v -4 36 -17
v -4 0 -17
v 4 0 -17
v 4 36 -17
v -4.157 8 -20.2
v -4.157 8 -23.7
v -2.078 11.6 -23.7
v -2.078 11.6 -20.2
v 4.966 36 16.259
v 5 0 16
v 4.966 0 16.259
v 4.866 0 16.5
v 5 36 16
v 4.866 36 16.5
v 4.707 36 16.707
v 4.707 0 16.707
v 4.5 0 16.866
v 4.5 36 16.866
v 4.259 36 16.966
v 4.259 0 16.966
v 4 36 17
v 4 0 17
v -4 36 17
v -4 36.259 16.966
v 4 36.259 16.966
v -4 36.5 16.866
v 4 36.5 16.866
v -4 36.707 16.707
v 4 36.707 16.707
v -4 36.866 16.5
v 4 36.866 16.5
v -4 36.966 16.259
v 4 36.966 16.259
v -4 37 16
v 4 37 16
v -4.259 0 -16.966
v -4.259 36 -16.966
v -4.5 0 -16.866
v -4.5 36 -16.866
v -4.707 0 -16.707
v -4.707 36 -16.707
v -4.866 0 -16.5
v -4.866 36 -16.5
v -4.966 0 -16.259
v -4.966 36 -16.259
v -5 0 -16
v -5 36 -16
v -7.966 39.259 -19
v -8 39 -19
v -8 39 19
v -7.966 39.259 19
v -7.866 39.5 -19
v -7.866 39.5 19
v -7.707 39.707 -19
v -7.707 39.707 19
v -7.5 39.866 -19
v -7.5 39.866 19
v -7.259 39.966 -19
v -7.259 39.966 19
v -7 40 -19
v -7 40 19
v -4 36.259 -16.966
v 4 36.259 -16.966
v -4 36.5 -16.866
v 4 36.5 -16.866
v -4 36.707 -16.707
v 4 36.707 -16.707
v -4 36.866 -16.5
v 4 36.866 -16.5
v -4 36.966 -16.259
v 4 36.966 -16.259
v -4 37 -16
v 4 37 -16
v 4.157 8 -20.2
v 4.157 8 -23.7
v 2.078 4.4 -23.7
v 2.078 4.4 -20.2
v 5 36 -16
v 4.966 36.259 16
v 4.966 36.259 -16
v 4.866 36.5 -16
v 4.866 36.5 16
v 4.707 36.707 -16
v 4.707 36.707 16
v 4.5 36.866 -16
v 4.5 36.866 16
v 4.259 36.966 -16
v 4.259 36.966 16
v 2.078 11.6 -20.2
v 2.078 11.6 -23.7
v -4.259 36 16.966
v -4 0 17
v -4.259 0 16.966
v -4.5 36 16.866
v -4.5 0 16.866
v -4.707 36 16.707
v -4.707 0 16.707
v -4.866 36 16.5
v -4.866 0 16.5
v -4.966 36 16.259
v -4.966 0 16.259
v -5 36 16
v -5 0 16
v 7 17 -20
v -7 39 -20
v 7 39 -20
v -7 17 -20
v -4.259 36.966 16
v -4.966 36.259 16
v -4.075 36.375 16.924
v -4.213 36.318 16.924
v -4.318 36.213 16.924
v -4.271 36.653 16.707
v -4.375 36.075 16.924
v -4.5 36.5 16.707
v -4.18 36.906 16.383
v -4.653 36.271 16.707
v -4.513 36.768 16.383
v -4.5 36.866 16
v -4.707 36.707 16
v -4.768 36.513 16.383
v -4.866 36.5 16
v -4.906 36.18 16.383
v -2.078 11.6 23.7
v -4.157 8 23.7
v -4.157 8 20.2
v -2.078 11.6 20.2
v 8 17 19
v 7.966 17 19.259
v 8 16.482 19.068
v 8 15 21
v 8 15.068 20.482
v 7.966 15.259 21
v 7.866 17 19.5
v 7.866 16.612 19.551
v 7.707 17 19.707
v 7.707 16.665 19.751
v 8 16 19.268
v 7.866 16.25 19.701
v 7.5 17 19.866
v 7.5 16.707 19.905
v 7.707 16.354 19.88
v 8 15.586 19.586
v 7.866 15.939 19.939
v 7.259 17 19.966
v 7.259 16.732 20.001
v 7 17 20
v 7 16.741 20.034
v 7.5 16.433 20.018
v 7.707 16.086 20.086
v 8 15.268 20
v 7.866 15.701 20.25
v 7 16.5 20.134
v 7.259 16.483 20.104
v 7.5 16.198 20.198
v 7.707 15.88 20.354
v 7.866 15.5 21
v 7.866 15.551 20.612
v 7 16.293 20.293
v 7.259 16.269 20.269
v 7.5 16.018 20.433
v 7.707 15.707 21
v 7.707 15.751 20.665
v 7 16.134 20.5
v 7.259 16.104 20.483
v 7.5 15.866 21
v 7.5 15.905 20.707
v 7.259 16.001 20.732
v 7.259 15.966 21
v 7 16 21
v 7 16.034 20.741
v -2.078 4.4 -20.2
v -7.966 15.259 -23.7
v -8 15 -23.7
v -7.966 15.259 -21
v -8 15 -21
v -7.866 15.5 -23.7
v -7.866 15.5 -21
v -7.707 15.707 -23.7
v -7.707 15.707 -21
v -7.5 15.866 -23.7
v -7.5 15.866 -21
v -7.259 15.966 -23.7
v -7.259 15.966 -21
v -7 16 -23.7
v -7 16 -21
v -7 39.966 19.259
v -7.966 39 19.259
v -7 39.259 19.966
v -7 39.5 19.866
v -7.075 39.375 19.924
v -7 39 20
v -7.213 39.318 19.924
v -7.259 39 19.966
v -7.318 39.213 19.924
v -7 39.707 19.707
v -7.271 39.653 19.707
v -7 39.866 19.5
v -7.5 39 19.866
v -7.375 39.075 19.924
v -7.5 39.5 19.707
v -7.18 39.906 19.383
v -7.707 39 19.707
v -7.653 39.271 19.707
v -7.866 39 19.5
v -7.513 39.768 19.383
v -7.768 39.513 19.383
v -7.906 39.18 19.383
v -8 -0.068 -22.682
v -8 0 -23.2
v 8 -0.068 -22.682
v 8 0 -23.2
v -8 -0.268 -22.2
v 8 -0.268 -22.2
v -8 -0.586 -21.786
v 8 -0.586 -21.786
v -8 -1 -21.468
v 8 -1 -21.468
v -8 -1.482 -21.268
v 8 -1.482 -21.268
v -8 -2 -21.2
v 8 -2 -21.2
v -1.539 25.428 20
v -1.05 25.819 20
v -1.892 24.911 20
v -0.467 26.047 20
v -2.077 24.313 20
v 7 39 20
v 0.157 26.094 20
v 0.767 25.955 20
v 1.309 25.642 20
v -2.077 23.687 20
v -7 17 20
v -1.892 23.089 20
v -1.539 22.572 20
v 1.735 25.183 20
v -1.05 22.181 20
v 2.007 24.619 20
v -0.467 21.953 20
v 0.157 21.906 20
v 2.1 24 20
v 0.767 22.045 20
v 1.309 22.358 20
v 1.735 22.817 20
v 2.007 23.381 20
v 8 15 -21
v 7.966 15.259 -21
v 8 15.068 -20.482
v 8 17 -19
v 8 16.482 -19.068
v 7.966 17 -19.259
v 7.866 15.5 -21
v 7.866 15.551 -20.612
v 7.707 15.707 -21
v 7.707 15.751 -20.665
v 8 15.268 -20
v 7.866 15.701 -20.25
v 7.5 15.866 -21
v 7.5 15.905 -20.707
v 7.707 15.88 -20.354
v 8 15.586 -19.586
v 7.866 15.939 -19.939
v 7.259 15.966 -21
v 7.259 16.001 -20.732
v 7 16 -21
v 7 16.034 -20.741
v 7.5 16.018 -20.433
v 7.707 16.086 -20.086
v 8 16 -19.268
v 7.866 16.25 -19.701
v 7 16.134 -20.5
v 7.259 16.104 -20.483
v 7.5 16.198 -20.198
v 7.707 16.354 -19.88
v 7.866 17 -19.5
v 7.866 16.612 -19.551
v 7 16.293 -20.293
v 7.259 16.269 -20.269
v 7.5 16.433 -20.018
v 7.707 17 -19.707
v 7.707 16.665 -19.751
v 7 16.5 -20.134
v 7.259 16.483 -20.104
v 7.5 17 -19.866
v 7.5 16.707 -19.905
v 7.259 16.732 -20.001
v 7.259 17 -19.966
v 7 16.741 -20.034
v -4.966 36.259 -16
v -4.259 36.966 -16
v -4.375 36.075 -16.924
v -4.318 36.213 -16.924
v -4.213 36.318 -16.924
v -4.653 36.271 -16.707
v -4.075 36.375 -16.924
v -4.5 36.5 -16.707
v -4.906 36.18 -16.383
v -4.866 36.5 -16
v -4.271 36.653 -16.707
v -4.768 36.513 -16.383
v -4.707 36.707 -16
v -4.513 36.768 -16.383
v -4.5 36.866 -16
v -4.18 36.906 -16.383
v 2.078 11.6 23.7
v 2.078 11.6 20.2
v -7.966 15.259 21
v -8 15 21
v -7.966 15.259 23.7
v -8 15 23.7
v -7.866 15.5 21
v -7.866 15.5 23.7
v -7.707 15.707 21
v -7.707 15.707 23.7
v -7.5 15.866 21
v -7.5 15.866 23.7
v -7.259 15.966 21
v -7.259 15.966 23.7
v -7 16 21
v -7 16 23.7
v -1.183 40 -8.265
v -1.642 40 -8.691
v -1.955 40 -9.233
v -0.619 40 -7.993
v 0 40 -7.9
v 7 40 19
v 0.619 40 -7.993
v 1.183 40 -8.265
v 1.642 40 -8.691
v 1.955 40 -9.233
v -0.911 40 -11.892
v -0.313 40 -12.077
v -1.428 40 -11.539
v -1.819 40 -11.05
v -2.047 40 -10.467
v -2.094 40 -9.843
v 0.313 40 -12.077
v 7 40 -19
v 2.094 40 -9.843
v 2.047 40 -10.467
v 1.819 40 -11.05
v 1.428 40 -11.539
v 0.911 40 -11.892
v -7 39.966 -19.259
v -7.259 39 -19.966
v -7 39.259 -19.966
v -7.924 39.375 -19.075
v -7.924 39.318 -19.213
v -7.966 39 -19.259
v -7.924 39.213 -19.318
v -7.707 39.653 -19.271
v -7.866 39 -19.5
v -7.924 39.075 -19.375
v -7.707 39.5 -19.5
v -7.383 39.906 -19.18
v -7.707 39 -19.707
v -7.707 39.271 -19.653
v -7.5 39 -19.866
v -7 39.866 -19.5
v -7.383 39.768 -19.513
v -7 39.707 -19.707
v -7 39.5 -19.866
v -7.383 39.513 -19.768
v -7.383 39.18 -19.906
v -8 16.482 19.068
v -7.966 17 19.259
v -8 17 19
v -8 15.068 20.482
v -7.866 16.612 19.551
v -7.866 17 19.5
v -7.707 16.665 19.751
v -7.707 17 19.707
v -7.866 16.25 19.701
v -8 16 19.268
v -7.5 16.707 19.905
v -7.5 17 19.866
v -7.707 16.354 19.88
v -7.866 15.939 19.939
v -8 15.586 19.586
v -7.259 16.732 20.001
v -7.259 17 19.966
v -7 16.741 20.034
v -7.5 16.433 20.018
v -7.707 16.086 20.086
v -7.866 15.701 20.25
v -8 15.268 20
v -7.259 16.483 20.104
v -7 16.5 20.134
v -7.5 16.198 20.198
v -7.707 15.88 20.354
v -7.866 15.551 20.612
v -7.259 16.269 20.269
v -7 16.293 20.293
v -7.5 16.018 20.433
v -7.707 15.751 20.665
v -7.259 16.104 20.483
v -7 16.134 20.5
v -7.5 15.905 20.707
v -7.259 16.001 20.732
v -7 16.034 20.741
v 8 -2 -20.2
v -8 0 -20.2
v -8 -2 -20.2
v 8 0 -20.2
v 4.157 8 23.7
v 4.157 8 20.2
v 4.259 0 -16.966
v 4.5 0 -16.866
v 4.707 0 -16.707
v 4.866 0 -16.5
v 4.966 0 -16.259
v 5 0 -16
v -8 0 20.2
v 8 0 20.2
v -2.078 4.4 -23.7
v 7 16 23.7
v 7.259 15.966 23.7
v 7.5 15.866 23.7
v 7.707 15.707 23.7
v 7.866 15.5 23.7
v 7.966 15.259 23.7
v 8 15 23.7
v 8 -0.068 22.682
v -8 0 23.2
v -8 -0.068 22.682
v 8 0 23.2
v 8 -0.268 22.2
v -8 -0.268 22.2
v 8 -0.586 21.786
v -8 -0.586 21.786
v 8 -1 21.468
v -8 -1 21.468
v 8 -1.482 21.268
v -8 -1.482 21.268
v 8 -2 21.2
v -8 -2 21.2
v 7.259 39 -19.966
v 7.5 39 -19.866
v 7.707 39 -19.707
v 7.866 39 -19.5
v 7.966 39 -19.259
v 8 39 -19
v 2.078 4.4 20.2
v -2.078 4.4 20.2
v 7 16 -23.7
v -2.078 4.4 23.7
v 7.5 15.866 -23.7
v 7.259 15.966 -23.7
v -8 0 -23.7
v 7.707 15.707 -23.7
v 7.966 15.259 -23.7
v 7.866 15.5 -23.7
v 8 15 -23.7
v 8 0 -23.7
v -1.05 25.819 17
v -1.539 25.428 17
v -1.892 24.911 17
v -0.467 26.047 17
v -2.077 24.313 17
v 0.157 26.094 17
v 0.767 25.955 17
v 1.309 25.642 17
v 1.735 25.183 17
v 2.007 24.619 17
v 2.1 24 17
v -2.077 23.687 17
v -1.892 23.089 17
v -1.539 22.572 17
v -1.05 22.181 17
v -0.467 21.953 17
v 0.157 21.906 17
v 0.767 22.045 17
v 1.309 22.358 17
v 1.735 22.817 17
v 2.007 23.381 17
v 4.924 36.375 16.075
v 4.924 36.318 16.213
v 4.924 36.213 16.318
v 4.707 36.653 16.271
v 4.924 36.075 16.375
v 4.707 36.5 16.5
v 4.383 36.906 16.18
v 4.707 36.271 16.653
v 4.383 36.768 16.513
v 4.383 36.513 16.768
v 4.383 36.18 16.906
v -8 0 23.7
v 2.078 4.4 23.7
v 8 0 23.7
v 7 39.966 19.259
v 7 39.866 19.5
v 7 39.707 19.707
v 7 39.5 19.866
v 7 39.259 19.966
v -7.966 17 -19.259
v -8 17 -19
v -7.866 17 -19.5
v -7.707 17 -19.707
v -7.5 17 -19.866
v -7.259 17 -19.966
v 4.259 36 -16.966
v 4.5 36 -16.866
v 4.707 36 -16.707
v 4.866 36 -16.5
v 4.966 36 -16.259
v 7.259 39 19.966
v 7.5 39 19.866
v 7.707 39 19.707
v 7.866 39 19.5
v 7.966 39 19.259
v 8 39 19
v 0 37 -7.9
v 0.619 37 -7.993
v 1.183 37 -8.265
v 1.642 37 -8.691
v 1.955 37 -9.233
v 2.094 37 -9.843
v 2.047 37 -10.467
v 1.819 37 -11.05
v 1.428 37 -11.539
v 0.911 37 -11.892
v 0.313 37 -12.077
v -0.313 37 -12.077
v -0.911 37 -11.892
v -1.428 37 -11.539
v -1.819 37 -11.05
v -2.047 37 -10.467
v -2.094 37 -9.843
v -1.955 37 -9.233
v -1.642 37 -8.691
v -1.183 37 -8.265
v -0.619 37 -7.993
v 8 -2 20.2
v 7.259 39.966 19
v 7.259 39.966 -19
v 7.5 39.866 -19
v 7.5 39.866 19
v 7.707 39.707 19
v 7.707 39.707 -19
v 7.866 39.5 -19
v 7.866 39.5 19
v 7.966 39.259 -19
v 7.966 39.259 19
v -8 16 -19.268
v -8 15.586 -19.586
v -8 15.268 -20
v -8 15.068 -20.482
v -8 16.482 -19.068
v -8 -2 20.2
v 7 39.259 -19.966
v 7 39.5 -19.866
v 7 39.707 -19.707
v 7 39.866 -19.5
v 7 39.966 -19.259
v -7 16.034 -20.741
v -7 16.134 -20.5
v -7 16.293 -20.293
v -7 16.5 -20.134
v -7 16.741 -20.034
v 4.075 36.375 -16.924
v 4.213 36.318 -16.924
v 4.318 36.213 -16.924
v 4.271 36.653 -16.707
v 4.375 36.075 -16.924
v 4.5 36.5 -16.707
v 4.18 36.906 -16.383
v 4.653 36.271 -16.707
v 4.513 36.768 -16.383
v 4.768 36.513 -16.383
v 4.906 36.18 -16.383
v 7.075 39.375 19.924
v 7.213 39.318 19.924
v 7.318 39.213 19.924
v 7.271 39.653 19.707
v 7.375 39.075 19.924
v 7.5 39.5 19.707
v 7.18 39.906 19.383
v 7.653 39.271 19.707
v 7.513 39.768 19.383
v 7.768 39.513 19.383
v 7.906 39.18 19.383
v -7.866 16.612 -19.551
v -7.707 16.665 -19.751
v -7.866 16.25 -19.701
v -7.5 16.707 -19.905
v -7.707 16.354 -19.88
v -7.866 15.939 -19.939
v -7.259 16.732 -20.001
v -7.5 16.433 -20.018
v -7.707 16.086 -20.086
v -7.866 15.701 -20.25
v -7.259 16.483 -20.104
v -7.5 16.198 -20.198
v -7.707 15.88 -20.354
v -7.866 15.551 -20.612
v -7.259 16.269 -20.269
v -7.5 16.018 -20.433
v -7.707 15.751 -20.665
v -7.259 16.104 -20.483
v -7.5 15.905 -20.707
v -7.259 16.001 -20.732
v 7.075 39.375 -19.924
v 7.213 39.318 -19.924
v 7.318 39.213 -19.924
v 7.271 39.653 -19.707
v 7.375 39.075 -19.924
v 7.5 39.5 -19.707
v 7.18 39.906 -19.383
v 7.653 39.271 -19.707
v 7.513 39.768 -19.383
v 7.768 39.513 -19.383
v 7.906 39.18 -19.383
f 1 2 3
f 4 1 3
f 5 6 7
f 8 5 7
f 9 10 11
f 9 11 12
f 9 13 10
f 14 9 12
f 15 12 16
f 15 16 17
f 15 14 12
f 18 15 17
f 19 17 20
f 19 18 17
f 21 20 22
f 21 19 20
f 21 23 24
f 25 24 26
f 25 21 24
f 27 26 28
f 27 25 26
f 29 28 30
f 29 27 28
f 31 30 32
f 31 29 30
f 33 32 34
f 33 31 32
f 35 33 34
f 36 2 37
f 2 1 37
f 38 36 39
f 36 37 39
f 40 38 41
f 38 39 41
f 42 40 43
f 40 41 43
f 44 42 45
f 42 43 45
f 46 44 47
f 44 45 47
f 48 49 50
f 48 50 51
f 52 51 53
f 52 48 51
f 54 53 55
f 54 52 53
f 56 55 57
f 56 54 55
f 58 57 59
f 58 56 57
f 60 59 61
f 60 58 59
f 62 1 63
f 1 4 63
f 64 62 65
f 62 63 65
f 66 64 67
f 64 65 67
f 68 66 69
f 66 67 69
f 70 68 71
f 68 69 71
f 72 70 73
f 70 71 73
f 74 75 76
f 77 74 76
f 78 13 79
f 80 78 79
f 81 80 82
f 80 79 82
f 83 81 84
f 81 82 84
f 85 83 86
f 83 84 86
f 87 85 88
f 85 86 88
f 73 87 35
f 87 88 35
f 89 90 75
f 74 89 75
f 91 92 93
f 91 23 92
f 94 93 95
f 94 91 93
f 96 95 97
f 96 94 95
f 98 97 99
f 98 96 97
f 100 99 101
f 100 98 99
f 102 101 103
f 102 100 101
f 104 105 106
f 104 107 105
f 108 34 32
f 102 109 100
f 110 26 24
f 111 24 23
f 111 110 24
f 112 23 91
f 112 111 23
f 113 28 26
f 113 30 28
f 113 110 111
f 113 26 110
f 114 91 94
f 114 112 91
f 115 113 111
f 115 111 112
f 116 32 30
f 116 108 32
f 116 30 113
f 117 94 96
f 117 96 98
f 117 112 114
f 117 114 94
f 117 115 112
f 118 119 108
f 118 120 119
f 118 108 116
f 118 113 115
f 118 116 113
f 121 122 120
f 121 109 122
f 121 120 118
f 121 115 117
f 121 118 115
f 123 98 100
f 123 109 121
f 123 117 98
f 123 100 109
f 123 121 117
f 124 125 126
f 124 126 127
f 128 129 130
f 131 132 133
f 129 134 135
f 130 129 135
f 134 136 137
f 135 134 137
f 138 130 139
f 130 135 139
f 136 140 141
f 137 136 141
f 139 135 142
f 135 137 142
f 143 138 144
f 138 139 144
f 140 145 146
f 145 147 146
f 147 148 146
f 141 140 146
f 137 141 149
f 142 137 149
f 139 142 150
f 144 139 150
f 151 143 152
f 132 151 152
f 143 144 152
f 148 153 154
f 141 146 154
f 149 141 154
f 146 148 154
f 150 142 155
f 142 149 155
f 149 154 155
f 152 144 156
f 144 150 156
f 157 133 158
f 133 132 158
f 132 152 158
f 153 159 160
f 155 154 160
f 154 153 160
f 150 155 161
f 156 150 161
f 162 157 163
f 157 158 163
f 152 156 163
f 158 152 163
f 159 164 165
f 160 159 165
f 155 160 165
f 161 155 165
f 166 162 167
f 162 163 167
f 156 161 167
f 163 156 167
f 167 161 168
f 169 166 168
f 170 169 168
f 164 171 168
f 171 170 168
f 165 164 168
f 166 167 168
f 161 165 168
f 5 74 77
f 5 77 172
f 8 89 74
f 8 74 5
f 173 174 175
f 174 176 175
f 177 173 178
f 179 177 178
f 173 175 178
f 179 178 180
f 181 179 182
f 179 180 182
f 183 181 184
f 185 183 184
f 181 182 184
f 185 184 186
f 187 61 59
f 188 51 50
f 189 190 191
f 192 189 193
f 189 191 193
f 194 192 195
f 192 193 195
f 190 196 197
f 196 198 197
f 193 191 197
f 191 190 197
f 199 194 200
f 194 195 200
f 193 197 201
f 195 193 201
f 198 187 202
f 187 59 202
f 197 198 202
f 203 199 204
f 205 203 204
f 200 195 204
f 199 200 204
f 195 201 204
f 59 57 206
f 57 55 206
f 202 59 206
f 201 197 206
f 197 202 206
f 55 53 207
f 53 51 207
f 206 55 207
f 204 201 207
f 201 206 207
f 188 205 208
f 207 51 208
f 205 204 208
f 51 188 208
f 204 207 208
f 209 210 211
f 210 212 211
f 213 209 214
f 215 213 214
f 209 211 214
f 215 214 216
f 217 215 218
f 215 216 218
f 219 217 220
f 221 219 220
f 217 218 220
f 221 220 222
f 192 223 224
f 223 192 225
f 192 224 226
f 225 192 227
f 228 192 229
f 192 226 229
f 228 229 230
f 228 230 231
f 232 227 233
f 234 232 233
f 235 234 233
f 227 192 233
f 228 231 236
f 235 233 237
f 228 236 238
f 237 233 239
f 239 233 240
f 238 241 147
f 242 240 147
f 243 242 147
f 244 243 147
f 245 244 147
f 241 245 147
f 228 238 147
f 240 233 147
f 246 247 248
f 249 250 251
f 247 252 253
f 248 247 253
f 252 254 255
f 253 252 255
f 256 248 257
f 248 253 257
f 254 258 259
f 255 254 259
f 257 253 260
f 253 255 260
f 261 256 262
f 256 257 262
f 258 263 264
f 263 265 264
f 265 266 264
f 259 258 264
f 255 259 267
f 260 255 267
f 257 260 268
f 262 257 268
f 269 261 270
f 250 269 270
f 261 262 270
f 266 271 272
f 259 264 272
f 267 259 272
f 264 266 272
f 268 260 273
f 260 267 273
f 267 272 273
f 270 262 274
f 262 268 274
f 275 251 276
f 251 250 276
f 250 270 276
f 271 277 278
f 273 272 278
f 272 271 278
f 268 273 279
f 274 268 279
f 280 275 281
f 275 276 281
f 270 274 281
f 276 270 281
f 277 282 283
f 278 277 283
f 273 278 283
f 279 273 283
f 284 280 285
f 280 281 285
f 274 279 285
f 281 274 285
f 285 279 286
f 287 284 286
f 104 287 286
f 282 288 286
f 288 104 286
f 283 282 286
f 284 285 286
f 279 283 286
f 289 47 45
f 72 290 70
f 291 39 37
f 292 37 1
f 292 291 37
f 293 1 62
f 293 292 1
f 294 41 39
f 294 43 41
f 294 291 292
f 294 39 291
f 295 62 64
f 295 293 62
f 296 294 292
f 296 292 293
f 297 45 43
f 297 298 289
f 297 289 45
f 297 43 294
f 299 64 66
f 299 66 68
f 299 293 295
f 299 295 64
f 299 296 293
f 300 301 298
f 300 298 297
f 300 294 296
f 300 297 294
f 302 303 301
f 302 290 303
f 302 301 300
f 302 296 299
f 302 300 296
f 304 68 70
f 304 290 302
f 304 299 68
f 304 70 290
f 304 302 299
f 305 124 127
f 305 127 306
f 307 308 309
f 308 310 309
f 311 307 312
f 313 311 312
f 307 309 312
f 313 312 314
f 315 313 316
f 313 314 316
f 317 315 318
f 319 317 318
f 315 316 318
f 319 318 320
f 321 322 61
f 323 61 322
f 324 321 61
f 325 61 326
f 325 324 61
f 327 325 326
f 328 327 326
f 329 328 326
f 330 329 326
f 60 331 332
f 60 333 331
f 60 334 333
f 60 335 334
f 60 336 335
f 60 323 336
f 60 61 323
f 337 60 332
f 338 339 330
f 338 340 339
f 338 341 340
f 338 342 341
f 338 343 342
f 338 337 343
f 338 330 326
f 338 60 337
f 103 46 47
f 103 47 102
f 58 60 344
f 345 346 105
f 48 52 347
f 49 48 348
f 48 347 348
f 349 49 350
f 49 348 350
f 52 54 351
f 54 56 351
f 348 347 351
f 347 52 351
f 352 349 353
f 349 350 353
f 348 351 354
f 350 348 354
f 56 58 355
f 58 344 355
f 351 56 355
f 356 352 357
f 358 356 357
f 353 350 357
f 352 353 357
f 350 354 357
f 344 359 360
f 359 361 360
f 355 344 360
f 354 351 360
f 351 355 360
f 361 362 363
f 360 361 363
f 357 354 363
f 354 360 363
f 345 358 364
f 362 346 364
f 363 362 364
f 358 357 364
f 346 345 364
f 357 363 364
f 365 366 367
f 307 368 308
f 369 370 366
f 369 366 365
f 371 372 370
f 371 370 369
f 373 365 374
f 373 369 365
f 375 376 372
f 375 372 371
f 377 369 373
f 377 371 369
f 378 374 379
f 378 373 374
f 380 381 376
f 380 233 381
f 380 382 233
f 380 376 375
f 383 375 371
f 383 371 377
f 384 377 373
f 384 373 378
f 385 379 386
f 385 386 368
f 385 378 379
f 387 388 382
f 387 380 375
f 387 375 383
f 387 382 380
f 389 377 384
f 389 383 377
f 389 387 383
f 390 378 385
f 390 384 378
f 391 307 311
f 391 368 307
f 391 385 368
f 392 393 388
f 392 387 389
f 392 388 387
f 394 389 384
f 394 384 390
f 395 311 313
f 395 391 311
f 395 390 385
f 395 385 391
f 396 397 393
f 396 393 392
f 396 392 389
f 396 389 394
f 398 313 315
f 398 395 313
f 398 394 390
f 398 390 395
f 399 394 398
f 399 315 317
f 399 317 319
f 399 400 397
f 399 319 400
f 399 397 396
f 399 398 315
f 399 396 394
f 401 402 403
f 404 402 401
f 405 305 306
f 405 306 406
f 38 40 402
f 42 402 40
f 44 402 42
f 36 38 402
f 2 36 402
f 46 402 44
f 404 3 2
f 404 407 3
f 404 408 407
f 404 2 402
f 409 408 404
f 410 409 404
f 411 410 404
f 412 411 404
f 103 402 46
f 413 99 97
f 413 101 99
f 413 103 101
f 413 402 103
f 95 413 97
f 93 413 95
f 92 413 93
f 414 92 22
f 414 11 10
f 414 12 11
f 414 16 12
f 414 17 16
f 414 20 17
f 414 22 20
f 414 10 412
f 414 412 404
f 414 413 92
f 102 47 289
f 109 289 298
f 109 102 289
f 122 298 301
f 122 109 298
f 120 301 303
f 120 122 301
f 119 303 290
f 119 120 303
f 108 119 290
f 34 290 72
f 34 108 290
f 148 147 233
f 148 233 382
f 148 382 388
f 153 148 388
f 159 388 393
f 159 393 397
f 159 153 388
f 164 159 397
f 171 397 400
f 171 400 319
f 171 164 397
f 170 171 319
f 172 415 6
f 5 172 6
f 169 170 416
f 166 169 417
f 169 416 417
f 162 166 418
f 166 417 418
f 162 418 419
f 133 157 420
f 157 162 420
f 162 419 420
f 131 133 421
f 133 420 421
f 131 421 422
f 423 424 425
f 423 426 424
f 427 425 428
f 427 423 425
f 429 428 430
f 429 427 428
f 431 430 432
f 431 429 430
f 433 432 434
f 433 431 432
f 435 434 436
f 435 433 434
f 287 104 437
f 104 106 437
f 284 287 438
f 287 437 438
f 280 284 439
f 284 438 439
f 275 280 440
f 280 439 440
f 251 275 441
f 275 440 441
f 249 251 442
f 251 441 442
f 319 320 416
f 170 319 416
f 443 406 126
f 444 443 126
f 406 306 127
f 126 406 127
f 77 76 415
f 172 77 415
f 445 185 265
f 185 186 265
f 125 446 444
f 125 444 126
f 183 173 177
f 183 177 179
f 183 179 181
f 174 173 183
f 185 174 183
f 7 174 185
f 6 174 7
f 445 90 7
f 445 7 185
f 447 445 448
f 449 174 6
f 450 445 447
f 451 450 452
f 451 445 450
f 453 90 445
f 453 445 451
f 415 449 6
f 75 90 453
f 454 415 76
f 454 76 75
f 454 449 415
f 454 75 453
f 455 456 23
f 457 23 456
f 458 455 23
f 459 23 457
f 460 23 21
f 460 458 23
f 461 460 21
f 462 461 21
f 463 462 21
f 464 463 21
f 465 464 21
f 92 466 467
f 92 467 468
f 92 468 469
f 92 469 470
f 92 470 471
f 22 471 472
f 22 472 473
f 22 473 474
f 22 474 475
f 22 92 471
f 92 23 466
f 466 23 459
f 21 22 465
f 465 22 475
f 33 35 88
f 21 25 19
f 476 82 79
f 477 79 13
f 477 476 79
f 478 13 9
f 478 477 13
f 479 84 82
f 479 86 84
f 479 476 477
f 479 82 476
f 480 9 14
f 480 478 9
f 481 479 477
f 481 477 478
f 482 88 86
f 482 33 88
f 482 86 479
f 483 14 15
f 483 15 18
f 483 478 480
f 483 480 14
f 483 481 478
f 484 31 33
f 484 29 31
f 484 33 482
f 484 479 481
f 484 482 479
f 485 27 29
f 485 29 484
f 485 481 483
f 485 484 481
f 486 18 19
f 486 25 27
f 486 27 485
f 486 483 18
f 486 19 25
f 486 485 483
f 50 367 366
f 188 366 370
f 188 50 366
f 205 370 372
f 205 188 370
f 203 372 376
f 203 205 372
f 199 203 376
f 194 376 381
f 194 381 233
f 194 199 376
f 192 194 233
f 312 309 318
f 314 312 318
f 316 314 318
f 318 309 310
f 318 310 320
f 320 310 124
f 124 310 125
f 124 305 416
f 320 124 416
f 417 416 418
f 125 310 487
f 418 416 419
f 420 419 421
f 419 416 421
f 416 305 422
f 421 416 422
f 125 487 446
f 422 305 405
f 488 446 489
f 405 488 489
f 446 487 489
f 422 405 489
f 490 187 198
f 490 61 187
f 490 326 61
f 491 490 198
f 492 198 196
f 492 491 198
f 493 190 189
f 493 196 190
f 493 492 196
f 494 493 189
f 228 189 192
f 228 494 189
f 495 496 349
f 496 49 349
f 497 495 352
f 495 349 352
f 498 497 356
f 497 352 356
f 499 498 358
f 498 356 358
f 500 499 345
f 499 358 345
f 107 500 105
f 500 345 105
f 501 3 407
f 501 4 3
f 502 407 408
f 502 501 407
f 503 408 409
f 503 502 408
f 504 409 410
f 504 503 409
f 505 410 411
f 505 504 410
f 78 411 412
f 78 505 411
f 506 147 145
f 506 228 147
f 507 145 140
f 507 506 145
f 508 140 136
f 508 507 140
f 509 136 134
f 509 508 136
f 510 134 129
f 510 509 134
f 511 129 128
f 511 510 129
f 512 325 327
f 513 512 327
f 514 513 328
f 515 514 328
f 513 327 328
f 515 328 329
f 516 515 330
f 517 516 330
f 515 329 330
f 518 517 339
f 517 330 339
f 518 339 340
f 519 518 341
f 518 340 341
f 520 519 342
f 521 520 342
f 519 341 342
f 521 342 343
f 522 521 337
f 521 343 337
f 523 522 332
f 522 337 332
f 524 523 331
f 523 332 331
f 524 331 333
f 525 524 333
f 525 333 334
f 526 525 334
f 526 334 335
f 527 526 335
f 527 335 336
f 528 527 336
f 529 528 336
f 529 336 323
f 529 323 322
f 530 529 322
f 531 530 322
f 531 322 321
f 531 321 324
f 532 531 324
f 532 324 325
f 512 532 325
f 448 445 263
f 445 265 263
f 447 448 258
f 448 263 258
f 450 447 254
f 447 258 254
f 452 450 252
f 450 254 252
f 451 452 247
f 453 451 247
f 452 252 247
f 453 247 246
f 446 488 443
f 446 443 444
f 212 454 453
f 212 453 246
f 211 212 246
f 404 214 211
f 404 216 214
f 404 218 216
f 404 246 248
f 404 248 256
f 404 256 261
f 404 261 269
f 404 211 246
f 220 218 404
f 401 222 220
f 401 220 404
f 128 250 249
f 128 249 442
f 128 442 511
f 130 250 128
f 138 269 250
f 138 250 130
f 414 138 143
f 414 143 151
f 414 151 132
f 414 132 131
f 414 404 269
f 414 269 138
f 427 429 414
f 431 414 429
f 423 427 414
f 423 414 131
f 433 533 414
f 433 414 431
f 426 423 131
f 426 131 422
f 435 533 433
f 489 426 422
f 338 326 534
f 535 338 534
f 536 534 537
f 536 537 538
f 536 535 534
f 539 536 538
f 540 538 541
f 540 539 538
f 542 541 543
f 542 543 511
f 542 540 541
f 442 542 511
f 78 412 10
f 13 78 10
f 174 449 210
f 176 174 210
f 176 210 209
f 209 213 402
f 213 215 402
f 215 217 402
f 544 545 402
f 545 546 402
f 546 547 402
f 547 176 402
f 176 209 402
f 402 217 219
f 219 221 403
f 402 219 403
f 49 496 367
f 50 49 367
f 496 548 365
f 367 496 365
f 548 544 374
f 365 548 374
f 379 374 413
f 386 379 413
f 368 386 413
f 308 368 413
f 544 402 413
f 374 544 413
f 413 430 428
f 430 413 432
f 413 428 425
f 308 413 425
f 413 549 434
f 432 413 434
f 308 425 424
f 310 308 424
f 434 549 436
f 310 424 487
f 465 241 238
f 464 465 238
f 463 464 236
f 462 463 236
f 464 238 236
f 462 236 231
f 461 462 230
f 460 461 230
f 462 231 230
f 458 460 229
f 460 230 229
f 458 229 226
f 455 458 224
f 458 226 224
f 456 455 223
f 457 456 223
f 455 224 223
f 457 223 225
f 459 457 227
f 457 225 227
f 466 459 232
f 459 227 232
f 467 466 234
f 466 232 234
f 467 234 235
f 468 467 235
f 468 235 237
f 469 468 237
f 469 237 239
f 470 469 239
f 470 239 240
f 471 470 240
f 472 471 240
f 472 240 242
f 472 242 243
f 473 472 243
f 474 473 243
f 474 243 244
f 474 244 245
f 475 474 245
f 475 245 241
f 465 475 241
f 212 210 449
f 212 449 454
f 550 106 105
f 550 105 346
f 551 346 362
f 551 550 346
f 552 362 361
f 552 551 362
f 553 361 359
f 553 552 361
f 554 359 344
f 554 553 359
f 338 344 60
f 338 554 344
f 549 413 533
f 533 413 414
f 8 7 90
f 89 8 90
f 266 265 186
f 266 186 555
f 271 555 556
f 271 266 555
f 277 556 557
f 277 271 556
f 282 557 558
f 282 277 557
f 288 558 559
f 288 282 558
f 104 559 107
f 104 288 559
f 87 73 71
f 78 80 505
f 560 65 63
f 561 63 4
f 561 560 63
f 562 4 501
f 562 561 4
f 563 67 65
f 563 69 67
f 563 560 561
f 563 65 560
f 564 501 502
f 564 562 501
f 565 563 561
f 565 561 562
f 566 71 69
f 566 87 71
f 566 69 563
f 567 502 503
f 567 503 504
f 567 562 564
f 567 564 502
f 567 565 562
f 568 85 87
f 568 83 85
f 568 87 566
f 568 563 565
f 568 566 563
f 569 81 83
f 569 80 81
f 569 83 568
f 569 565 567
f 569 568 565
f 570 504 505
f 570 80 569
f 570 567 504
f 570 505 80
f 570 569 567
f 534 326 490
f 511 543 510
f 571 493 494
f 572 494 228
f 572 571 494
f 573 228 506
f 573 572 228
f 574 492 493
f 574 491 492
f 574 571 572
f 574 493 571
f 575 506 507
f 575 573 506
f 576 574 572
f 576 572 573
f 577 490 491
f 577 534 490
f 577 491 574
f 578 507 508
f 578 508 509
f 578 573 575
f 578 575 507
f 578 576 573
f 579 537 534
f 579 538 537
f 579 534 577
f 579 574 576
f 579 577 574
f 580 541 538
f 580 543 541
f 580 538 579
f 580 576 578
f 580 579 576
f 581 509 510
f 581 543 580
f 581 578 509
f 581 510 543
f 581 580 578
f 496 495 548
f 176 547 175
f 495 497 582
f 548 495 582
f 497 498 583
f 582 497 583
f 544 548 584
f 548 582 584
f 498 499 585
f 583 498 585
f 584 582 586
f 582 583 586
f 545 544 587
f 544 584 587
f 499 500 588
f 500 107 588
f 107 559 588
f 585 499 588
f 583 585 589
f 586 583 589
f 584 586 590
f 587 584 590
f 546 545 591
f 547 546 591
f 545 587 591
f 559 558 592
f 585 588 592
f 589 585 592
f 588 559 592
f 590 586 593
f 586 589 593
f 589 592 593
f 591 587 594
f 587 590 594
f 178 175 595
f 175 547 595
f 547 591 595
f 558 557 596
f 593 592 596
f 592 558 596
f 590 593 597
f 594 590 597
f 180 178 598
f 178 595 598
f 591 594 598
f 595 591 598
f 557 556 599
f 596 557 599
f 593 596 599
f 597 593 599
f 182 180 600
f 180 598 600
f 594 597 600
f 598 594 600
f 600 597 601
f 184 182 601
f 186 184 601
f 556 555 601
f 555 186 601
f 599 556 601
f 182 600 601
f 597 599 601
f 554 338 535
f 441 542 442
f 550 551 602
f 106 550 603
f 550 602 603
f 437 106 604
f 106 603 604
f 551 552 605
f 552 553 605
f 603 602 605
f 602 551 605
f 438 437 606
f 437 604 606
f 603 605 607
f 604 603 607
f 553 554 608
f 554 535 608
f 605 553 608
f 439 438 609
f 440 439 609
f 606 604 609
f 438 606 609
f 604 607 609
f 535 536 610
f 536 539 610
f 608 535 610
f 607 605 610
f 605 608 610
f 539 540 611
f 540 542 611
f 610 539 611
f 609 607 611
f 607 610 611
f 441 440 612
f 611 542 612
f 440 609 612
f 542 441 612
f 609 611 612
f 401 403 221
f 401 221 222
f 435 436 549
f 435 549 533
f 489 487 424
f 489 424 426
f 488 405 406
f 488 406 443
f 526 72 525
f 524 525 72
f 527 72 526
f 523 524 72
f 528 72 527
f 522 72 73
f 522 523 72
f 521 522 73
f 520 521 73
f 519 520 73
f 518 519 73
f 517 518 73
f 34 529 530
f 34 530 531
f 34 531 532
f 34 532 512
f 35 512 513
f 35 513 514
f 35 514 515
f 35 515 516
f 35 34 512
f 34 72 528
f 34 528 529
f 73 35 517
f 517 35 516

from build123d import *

# Parameters (mm, degrees)
SKETCH1_W           = 16
SKETCH1_H           = 40
BOSS_EXTRUDE1_DEPTH = 40
SKETCH2_W           = 16
SKETCH2_H           = 3.7
BOSS_EXTRUDE2_DEPTH = 16
SKETCH5_W           = 10
SKETCH5_H           = 34
CUT_EXTRUDE3_DEPTH  = 37
FILLET1_R           = 1
FILLET2_R           = 1
CUT_EXTRUDE6_DEPTH  = 3.5
SKETCH9_W           = 16
SKETCH9_H           = 1
BOSS_EXTRUDE3_DEPTH = 2
CUT_EXTRUDE7_REACH  = 61.78
SKETCH12_R          = 2.1
CUT_EXTRUDE8_REACH  = 50.884
SKETCH13_R          = 2.1
FILLET3_R           = 2


with BuildPart() as part:
    # Sketch1 → Boss-Extrude1 (new body)
    with BuildSketch(Plane(origin=(0, 0, 0), x_dir=(1, 0, 0), z_dir=(0, 1, 0))):
        Rectangle(SKETCH1_W, SKETCH1_H)
    extrude(amount=BOSS_EXTRUDE1_DEPTH)

    # Sketch2 → Boss-Extrude2 (add)
    with BuildSketch(Plane.XZ):
        with Locations((0, 21.85)):
            Rectangle(SKETCH2_W, SKETCH2_H)
        with Locations((0, -21.85)):
            Rectangle(SKETCH2_W, SKETCH2_H)
    extrude(amount=-BOSS_EXTRUDE2_DEPTH)

    # Sketch5 → Cut-Extrude3 (cut)
    with BuildSketch(Plane.XZ):
        Rectangle(SKETCH5_W, SKETCH5_H)
    extrude(amount=-CUT_EXTRUDE3_DEPTH, mode=Mode.SUBTRACT)

    # Fillet1
    fillet1_edges = [part.edges().sort_by_distance(p)[0] for p in [
        (8, 40, 0),
        (0, 40, -20),
        (-8, 16, 21.85),
        (8, 16, 21.85),
        (0, 16, 20),
        (-8, 16, -21.85),
        (0, 16, -20),
        (8, 16, -21.85),
        (-8, 40, 0),
        (0, 40, 20),
        (-8, 28, -20),
        (8, 28, -20),
        (8, 28, 20),
        (-8, 28, 20),
    ]]
    fillet(fillet1_edges, radius=FILLET1_R)

    # Fillet2
    fillet2_edges = [part.edges().sort_by_distance(p)[0] for p in [
        (-5, 37, 0),
        (-5, 18.5, -17),
        (0, 37, 17),
        (-5, 18.5, 17),
        (5, 37, 0),
        (5, 18.5, 17),
        (0, 37, -17),
        (5, 18.5, -17),
    ]]
    fillet(fillet2_edges, radius=FILLET2_R)

    # Sketch3 → Cut-Extrude6 (cut)
    with BuildSketch(Plane(origin=(0, 0, -23.7), x_dir=(-1, 0, 0), z_dir=(0, 0, -1))):
        Polygon((2.078460969, 11.6), (-2.078460969, 11.6), (-4.156921938, 8), (-2.078460969, 4.4), (2.078460969, 4.4), (4.156921938, 8), align=None)
    cut_extrude6 = extrude(amount=-CUT_EXTRUDE6_DEPTH, mode=Mode.SUBTRACT)

    # Mirror2: Cut-Extrude6 across plane
    add(cut_extrude6.mirror(Plane.XY), mode=Mode.SUBTRACT)

    # Sketch9 → Boss-Extrude3 (add)
    with BuildSketch(Plane.XZ):
        with Locations((0, 20.7)):
            Rectangle(SKETCH9_W, SKETCH9_H)
        with Locations((0, -20.7)):
            Rectangle(SKETCH9_W, SKETCH9_H)
    extrude(amount=BOSS_EXTRUDE3_DEPTH)

    # Sketch12 → Cut-Extrude7 (cut, up to next)
    with BuildSketch(Plane.XY.offset(20), mode=Mode.PRIVATE) as cut_extrude7_sk1:
        with Locations((0, 24)):
            Circle(SKETCH12_R)
    cut_extrude7_tool1 = extrude(cut_extrude7_sk1.sketch, amount=-CUT_EXTRUDE7_REACH, mode=Mode.PRIVATE) & part.part
    add(cut_extrude7_tool1.solids().sort_by_distance((0, 24, 20))[0], mode=Mode.SUBTRACT)

    # Sketch13 → Cut-Extrude8 (cut, up to next)
    with BuildSketch(Plane(origin=(0, 40, 0), x_dir=(1, 0, 0), z_dir=(0, 1, 0)), mode=Mode.PRIVATE) as cut_extrude8_sk1:
        with Locations(Location((0, 10, 0), (0, 0, 270))):
            Circle(SKETCH13_R)
    cut_extrude8_tool1 = extrude(cut_extrude8_sk1.sketch, amount=-CUT_EXTRUDE8_REACH, mode=Mode.PRIVATE) & part.part
    add(cut_extrude8_tool1.solids().sort_by_distance((0, 40, -10))[0], mode=Mode.SUBTRACT)

    # Fillet3
    fillet3_edges = [part.edges().sort_by_distance(p)[0] for p in [
        (0, 0, 21.2),
        (0, 0, -21.2),
    ]]
    fillet(fillet3_edges, radius=FILLET3_R - 0.0001)  # a hair under: the kernel refuses the full size


solid = part.part
